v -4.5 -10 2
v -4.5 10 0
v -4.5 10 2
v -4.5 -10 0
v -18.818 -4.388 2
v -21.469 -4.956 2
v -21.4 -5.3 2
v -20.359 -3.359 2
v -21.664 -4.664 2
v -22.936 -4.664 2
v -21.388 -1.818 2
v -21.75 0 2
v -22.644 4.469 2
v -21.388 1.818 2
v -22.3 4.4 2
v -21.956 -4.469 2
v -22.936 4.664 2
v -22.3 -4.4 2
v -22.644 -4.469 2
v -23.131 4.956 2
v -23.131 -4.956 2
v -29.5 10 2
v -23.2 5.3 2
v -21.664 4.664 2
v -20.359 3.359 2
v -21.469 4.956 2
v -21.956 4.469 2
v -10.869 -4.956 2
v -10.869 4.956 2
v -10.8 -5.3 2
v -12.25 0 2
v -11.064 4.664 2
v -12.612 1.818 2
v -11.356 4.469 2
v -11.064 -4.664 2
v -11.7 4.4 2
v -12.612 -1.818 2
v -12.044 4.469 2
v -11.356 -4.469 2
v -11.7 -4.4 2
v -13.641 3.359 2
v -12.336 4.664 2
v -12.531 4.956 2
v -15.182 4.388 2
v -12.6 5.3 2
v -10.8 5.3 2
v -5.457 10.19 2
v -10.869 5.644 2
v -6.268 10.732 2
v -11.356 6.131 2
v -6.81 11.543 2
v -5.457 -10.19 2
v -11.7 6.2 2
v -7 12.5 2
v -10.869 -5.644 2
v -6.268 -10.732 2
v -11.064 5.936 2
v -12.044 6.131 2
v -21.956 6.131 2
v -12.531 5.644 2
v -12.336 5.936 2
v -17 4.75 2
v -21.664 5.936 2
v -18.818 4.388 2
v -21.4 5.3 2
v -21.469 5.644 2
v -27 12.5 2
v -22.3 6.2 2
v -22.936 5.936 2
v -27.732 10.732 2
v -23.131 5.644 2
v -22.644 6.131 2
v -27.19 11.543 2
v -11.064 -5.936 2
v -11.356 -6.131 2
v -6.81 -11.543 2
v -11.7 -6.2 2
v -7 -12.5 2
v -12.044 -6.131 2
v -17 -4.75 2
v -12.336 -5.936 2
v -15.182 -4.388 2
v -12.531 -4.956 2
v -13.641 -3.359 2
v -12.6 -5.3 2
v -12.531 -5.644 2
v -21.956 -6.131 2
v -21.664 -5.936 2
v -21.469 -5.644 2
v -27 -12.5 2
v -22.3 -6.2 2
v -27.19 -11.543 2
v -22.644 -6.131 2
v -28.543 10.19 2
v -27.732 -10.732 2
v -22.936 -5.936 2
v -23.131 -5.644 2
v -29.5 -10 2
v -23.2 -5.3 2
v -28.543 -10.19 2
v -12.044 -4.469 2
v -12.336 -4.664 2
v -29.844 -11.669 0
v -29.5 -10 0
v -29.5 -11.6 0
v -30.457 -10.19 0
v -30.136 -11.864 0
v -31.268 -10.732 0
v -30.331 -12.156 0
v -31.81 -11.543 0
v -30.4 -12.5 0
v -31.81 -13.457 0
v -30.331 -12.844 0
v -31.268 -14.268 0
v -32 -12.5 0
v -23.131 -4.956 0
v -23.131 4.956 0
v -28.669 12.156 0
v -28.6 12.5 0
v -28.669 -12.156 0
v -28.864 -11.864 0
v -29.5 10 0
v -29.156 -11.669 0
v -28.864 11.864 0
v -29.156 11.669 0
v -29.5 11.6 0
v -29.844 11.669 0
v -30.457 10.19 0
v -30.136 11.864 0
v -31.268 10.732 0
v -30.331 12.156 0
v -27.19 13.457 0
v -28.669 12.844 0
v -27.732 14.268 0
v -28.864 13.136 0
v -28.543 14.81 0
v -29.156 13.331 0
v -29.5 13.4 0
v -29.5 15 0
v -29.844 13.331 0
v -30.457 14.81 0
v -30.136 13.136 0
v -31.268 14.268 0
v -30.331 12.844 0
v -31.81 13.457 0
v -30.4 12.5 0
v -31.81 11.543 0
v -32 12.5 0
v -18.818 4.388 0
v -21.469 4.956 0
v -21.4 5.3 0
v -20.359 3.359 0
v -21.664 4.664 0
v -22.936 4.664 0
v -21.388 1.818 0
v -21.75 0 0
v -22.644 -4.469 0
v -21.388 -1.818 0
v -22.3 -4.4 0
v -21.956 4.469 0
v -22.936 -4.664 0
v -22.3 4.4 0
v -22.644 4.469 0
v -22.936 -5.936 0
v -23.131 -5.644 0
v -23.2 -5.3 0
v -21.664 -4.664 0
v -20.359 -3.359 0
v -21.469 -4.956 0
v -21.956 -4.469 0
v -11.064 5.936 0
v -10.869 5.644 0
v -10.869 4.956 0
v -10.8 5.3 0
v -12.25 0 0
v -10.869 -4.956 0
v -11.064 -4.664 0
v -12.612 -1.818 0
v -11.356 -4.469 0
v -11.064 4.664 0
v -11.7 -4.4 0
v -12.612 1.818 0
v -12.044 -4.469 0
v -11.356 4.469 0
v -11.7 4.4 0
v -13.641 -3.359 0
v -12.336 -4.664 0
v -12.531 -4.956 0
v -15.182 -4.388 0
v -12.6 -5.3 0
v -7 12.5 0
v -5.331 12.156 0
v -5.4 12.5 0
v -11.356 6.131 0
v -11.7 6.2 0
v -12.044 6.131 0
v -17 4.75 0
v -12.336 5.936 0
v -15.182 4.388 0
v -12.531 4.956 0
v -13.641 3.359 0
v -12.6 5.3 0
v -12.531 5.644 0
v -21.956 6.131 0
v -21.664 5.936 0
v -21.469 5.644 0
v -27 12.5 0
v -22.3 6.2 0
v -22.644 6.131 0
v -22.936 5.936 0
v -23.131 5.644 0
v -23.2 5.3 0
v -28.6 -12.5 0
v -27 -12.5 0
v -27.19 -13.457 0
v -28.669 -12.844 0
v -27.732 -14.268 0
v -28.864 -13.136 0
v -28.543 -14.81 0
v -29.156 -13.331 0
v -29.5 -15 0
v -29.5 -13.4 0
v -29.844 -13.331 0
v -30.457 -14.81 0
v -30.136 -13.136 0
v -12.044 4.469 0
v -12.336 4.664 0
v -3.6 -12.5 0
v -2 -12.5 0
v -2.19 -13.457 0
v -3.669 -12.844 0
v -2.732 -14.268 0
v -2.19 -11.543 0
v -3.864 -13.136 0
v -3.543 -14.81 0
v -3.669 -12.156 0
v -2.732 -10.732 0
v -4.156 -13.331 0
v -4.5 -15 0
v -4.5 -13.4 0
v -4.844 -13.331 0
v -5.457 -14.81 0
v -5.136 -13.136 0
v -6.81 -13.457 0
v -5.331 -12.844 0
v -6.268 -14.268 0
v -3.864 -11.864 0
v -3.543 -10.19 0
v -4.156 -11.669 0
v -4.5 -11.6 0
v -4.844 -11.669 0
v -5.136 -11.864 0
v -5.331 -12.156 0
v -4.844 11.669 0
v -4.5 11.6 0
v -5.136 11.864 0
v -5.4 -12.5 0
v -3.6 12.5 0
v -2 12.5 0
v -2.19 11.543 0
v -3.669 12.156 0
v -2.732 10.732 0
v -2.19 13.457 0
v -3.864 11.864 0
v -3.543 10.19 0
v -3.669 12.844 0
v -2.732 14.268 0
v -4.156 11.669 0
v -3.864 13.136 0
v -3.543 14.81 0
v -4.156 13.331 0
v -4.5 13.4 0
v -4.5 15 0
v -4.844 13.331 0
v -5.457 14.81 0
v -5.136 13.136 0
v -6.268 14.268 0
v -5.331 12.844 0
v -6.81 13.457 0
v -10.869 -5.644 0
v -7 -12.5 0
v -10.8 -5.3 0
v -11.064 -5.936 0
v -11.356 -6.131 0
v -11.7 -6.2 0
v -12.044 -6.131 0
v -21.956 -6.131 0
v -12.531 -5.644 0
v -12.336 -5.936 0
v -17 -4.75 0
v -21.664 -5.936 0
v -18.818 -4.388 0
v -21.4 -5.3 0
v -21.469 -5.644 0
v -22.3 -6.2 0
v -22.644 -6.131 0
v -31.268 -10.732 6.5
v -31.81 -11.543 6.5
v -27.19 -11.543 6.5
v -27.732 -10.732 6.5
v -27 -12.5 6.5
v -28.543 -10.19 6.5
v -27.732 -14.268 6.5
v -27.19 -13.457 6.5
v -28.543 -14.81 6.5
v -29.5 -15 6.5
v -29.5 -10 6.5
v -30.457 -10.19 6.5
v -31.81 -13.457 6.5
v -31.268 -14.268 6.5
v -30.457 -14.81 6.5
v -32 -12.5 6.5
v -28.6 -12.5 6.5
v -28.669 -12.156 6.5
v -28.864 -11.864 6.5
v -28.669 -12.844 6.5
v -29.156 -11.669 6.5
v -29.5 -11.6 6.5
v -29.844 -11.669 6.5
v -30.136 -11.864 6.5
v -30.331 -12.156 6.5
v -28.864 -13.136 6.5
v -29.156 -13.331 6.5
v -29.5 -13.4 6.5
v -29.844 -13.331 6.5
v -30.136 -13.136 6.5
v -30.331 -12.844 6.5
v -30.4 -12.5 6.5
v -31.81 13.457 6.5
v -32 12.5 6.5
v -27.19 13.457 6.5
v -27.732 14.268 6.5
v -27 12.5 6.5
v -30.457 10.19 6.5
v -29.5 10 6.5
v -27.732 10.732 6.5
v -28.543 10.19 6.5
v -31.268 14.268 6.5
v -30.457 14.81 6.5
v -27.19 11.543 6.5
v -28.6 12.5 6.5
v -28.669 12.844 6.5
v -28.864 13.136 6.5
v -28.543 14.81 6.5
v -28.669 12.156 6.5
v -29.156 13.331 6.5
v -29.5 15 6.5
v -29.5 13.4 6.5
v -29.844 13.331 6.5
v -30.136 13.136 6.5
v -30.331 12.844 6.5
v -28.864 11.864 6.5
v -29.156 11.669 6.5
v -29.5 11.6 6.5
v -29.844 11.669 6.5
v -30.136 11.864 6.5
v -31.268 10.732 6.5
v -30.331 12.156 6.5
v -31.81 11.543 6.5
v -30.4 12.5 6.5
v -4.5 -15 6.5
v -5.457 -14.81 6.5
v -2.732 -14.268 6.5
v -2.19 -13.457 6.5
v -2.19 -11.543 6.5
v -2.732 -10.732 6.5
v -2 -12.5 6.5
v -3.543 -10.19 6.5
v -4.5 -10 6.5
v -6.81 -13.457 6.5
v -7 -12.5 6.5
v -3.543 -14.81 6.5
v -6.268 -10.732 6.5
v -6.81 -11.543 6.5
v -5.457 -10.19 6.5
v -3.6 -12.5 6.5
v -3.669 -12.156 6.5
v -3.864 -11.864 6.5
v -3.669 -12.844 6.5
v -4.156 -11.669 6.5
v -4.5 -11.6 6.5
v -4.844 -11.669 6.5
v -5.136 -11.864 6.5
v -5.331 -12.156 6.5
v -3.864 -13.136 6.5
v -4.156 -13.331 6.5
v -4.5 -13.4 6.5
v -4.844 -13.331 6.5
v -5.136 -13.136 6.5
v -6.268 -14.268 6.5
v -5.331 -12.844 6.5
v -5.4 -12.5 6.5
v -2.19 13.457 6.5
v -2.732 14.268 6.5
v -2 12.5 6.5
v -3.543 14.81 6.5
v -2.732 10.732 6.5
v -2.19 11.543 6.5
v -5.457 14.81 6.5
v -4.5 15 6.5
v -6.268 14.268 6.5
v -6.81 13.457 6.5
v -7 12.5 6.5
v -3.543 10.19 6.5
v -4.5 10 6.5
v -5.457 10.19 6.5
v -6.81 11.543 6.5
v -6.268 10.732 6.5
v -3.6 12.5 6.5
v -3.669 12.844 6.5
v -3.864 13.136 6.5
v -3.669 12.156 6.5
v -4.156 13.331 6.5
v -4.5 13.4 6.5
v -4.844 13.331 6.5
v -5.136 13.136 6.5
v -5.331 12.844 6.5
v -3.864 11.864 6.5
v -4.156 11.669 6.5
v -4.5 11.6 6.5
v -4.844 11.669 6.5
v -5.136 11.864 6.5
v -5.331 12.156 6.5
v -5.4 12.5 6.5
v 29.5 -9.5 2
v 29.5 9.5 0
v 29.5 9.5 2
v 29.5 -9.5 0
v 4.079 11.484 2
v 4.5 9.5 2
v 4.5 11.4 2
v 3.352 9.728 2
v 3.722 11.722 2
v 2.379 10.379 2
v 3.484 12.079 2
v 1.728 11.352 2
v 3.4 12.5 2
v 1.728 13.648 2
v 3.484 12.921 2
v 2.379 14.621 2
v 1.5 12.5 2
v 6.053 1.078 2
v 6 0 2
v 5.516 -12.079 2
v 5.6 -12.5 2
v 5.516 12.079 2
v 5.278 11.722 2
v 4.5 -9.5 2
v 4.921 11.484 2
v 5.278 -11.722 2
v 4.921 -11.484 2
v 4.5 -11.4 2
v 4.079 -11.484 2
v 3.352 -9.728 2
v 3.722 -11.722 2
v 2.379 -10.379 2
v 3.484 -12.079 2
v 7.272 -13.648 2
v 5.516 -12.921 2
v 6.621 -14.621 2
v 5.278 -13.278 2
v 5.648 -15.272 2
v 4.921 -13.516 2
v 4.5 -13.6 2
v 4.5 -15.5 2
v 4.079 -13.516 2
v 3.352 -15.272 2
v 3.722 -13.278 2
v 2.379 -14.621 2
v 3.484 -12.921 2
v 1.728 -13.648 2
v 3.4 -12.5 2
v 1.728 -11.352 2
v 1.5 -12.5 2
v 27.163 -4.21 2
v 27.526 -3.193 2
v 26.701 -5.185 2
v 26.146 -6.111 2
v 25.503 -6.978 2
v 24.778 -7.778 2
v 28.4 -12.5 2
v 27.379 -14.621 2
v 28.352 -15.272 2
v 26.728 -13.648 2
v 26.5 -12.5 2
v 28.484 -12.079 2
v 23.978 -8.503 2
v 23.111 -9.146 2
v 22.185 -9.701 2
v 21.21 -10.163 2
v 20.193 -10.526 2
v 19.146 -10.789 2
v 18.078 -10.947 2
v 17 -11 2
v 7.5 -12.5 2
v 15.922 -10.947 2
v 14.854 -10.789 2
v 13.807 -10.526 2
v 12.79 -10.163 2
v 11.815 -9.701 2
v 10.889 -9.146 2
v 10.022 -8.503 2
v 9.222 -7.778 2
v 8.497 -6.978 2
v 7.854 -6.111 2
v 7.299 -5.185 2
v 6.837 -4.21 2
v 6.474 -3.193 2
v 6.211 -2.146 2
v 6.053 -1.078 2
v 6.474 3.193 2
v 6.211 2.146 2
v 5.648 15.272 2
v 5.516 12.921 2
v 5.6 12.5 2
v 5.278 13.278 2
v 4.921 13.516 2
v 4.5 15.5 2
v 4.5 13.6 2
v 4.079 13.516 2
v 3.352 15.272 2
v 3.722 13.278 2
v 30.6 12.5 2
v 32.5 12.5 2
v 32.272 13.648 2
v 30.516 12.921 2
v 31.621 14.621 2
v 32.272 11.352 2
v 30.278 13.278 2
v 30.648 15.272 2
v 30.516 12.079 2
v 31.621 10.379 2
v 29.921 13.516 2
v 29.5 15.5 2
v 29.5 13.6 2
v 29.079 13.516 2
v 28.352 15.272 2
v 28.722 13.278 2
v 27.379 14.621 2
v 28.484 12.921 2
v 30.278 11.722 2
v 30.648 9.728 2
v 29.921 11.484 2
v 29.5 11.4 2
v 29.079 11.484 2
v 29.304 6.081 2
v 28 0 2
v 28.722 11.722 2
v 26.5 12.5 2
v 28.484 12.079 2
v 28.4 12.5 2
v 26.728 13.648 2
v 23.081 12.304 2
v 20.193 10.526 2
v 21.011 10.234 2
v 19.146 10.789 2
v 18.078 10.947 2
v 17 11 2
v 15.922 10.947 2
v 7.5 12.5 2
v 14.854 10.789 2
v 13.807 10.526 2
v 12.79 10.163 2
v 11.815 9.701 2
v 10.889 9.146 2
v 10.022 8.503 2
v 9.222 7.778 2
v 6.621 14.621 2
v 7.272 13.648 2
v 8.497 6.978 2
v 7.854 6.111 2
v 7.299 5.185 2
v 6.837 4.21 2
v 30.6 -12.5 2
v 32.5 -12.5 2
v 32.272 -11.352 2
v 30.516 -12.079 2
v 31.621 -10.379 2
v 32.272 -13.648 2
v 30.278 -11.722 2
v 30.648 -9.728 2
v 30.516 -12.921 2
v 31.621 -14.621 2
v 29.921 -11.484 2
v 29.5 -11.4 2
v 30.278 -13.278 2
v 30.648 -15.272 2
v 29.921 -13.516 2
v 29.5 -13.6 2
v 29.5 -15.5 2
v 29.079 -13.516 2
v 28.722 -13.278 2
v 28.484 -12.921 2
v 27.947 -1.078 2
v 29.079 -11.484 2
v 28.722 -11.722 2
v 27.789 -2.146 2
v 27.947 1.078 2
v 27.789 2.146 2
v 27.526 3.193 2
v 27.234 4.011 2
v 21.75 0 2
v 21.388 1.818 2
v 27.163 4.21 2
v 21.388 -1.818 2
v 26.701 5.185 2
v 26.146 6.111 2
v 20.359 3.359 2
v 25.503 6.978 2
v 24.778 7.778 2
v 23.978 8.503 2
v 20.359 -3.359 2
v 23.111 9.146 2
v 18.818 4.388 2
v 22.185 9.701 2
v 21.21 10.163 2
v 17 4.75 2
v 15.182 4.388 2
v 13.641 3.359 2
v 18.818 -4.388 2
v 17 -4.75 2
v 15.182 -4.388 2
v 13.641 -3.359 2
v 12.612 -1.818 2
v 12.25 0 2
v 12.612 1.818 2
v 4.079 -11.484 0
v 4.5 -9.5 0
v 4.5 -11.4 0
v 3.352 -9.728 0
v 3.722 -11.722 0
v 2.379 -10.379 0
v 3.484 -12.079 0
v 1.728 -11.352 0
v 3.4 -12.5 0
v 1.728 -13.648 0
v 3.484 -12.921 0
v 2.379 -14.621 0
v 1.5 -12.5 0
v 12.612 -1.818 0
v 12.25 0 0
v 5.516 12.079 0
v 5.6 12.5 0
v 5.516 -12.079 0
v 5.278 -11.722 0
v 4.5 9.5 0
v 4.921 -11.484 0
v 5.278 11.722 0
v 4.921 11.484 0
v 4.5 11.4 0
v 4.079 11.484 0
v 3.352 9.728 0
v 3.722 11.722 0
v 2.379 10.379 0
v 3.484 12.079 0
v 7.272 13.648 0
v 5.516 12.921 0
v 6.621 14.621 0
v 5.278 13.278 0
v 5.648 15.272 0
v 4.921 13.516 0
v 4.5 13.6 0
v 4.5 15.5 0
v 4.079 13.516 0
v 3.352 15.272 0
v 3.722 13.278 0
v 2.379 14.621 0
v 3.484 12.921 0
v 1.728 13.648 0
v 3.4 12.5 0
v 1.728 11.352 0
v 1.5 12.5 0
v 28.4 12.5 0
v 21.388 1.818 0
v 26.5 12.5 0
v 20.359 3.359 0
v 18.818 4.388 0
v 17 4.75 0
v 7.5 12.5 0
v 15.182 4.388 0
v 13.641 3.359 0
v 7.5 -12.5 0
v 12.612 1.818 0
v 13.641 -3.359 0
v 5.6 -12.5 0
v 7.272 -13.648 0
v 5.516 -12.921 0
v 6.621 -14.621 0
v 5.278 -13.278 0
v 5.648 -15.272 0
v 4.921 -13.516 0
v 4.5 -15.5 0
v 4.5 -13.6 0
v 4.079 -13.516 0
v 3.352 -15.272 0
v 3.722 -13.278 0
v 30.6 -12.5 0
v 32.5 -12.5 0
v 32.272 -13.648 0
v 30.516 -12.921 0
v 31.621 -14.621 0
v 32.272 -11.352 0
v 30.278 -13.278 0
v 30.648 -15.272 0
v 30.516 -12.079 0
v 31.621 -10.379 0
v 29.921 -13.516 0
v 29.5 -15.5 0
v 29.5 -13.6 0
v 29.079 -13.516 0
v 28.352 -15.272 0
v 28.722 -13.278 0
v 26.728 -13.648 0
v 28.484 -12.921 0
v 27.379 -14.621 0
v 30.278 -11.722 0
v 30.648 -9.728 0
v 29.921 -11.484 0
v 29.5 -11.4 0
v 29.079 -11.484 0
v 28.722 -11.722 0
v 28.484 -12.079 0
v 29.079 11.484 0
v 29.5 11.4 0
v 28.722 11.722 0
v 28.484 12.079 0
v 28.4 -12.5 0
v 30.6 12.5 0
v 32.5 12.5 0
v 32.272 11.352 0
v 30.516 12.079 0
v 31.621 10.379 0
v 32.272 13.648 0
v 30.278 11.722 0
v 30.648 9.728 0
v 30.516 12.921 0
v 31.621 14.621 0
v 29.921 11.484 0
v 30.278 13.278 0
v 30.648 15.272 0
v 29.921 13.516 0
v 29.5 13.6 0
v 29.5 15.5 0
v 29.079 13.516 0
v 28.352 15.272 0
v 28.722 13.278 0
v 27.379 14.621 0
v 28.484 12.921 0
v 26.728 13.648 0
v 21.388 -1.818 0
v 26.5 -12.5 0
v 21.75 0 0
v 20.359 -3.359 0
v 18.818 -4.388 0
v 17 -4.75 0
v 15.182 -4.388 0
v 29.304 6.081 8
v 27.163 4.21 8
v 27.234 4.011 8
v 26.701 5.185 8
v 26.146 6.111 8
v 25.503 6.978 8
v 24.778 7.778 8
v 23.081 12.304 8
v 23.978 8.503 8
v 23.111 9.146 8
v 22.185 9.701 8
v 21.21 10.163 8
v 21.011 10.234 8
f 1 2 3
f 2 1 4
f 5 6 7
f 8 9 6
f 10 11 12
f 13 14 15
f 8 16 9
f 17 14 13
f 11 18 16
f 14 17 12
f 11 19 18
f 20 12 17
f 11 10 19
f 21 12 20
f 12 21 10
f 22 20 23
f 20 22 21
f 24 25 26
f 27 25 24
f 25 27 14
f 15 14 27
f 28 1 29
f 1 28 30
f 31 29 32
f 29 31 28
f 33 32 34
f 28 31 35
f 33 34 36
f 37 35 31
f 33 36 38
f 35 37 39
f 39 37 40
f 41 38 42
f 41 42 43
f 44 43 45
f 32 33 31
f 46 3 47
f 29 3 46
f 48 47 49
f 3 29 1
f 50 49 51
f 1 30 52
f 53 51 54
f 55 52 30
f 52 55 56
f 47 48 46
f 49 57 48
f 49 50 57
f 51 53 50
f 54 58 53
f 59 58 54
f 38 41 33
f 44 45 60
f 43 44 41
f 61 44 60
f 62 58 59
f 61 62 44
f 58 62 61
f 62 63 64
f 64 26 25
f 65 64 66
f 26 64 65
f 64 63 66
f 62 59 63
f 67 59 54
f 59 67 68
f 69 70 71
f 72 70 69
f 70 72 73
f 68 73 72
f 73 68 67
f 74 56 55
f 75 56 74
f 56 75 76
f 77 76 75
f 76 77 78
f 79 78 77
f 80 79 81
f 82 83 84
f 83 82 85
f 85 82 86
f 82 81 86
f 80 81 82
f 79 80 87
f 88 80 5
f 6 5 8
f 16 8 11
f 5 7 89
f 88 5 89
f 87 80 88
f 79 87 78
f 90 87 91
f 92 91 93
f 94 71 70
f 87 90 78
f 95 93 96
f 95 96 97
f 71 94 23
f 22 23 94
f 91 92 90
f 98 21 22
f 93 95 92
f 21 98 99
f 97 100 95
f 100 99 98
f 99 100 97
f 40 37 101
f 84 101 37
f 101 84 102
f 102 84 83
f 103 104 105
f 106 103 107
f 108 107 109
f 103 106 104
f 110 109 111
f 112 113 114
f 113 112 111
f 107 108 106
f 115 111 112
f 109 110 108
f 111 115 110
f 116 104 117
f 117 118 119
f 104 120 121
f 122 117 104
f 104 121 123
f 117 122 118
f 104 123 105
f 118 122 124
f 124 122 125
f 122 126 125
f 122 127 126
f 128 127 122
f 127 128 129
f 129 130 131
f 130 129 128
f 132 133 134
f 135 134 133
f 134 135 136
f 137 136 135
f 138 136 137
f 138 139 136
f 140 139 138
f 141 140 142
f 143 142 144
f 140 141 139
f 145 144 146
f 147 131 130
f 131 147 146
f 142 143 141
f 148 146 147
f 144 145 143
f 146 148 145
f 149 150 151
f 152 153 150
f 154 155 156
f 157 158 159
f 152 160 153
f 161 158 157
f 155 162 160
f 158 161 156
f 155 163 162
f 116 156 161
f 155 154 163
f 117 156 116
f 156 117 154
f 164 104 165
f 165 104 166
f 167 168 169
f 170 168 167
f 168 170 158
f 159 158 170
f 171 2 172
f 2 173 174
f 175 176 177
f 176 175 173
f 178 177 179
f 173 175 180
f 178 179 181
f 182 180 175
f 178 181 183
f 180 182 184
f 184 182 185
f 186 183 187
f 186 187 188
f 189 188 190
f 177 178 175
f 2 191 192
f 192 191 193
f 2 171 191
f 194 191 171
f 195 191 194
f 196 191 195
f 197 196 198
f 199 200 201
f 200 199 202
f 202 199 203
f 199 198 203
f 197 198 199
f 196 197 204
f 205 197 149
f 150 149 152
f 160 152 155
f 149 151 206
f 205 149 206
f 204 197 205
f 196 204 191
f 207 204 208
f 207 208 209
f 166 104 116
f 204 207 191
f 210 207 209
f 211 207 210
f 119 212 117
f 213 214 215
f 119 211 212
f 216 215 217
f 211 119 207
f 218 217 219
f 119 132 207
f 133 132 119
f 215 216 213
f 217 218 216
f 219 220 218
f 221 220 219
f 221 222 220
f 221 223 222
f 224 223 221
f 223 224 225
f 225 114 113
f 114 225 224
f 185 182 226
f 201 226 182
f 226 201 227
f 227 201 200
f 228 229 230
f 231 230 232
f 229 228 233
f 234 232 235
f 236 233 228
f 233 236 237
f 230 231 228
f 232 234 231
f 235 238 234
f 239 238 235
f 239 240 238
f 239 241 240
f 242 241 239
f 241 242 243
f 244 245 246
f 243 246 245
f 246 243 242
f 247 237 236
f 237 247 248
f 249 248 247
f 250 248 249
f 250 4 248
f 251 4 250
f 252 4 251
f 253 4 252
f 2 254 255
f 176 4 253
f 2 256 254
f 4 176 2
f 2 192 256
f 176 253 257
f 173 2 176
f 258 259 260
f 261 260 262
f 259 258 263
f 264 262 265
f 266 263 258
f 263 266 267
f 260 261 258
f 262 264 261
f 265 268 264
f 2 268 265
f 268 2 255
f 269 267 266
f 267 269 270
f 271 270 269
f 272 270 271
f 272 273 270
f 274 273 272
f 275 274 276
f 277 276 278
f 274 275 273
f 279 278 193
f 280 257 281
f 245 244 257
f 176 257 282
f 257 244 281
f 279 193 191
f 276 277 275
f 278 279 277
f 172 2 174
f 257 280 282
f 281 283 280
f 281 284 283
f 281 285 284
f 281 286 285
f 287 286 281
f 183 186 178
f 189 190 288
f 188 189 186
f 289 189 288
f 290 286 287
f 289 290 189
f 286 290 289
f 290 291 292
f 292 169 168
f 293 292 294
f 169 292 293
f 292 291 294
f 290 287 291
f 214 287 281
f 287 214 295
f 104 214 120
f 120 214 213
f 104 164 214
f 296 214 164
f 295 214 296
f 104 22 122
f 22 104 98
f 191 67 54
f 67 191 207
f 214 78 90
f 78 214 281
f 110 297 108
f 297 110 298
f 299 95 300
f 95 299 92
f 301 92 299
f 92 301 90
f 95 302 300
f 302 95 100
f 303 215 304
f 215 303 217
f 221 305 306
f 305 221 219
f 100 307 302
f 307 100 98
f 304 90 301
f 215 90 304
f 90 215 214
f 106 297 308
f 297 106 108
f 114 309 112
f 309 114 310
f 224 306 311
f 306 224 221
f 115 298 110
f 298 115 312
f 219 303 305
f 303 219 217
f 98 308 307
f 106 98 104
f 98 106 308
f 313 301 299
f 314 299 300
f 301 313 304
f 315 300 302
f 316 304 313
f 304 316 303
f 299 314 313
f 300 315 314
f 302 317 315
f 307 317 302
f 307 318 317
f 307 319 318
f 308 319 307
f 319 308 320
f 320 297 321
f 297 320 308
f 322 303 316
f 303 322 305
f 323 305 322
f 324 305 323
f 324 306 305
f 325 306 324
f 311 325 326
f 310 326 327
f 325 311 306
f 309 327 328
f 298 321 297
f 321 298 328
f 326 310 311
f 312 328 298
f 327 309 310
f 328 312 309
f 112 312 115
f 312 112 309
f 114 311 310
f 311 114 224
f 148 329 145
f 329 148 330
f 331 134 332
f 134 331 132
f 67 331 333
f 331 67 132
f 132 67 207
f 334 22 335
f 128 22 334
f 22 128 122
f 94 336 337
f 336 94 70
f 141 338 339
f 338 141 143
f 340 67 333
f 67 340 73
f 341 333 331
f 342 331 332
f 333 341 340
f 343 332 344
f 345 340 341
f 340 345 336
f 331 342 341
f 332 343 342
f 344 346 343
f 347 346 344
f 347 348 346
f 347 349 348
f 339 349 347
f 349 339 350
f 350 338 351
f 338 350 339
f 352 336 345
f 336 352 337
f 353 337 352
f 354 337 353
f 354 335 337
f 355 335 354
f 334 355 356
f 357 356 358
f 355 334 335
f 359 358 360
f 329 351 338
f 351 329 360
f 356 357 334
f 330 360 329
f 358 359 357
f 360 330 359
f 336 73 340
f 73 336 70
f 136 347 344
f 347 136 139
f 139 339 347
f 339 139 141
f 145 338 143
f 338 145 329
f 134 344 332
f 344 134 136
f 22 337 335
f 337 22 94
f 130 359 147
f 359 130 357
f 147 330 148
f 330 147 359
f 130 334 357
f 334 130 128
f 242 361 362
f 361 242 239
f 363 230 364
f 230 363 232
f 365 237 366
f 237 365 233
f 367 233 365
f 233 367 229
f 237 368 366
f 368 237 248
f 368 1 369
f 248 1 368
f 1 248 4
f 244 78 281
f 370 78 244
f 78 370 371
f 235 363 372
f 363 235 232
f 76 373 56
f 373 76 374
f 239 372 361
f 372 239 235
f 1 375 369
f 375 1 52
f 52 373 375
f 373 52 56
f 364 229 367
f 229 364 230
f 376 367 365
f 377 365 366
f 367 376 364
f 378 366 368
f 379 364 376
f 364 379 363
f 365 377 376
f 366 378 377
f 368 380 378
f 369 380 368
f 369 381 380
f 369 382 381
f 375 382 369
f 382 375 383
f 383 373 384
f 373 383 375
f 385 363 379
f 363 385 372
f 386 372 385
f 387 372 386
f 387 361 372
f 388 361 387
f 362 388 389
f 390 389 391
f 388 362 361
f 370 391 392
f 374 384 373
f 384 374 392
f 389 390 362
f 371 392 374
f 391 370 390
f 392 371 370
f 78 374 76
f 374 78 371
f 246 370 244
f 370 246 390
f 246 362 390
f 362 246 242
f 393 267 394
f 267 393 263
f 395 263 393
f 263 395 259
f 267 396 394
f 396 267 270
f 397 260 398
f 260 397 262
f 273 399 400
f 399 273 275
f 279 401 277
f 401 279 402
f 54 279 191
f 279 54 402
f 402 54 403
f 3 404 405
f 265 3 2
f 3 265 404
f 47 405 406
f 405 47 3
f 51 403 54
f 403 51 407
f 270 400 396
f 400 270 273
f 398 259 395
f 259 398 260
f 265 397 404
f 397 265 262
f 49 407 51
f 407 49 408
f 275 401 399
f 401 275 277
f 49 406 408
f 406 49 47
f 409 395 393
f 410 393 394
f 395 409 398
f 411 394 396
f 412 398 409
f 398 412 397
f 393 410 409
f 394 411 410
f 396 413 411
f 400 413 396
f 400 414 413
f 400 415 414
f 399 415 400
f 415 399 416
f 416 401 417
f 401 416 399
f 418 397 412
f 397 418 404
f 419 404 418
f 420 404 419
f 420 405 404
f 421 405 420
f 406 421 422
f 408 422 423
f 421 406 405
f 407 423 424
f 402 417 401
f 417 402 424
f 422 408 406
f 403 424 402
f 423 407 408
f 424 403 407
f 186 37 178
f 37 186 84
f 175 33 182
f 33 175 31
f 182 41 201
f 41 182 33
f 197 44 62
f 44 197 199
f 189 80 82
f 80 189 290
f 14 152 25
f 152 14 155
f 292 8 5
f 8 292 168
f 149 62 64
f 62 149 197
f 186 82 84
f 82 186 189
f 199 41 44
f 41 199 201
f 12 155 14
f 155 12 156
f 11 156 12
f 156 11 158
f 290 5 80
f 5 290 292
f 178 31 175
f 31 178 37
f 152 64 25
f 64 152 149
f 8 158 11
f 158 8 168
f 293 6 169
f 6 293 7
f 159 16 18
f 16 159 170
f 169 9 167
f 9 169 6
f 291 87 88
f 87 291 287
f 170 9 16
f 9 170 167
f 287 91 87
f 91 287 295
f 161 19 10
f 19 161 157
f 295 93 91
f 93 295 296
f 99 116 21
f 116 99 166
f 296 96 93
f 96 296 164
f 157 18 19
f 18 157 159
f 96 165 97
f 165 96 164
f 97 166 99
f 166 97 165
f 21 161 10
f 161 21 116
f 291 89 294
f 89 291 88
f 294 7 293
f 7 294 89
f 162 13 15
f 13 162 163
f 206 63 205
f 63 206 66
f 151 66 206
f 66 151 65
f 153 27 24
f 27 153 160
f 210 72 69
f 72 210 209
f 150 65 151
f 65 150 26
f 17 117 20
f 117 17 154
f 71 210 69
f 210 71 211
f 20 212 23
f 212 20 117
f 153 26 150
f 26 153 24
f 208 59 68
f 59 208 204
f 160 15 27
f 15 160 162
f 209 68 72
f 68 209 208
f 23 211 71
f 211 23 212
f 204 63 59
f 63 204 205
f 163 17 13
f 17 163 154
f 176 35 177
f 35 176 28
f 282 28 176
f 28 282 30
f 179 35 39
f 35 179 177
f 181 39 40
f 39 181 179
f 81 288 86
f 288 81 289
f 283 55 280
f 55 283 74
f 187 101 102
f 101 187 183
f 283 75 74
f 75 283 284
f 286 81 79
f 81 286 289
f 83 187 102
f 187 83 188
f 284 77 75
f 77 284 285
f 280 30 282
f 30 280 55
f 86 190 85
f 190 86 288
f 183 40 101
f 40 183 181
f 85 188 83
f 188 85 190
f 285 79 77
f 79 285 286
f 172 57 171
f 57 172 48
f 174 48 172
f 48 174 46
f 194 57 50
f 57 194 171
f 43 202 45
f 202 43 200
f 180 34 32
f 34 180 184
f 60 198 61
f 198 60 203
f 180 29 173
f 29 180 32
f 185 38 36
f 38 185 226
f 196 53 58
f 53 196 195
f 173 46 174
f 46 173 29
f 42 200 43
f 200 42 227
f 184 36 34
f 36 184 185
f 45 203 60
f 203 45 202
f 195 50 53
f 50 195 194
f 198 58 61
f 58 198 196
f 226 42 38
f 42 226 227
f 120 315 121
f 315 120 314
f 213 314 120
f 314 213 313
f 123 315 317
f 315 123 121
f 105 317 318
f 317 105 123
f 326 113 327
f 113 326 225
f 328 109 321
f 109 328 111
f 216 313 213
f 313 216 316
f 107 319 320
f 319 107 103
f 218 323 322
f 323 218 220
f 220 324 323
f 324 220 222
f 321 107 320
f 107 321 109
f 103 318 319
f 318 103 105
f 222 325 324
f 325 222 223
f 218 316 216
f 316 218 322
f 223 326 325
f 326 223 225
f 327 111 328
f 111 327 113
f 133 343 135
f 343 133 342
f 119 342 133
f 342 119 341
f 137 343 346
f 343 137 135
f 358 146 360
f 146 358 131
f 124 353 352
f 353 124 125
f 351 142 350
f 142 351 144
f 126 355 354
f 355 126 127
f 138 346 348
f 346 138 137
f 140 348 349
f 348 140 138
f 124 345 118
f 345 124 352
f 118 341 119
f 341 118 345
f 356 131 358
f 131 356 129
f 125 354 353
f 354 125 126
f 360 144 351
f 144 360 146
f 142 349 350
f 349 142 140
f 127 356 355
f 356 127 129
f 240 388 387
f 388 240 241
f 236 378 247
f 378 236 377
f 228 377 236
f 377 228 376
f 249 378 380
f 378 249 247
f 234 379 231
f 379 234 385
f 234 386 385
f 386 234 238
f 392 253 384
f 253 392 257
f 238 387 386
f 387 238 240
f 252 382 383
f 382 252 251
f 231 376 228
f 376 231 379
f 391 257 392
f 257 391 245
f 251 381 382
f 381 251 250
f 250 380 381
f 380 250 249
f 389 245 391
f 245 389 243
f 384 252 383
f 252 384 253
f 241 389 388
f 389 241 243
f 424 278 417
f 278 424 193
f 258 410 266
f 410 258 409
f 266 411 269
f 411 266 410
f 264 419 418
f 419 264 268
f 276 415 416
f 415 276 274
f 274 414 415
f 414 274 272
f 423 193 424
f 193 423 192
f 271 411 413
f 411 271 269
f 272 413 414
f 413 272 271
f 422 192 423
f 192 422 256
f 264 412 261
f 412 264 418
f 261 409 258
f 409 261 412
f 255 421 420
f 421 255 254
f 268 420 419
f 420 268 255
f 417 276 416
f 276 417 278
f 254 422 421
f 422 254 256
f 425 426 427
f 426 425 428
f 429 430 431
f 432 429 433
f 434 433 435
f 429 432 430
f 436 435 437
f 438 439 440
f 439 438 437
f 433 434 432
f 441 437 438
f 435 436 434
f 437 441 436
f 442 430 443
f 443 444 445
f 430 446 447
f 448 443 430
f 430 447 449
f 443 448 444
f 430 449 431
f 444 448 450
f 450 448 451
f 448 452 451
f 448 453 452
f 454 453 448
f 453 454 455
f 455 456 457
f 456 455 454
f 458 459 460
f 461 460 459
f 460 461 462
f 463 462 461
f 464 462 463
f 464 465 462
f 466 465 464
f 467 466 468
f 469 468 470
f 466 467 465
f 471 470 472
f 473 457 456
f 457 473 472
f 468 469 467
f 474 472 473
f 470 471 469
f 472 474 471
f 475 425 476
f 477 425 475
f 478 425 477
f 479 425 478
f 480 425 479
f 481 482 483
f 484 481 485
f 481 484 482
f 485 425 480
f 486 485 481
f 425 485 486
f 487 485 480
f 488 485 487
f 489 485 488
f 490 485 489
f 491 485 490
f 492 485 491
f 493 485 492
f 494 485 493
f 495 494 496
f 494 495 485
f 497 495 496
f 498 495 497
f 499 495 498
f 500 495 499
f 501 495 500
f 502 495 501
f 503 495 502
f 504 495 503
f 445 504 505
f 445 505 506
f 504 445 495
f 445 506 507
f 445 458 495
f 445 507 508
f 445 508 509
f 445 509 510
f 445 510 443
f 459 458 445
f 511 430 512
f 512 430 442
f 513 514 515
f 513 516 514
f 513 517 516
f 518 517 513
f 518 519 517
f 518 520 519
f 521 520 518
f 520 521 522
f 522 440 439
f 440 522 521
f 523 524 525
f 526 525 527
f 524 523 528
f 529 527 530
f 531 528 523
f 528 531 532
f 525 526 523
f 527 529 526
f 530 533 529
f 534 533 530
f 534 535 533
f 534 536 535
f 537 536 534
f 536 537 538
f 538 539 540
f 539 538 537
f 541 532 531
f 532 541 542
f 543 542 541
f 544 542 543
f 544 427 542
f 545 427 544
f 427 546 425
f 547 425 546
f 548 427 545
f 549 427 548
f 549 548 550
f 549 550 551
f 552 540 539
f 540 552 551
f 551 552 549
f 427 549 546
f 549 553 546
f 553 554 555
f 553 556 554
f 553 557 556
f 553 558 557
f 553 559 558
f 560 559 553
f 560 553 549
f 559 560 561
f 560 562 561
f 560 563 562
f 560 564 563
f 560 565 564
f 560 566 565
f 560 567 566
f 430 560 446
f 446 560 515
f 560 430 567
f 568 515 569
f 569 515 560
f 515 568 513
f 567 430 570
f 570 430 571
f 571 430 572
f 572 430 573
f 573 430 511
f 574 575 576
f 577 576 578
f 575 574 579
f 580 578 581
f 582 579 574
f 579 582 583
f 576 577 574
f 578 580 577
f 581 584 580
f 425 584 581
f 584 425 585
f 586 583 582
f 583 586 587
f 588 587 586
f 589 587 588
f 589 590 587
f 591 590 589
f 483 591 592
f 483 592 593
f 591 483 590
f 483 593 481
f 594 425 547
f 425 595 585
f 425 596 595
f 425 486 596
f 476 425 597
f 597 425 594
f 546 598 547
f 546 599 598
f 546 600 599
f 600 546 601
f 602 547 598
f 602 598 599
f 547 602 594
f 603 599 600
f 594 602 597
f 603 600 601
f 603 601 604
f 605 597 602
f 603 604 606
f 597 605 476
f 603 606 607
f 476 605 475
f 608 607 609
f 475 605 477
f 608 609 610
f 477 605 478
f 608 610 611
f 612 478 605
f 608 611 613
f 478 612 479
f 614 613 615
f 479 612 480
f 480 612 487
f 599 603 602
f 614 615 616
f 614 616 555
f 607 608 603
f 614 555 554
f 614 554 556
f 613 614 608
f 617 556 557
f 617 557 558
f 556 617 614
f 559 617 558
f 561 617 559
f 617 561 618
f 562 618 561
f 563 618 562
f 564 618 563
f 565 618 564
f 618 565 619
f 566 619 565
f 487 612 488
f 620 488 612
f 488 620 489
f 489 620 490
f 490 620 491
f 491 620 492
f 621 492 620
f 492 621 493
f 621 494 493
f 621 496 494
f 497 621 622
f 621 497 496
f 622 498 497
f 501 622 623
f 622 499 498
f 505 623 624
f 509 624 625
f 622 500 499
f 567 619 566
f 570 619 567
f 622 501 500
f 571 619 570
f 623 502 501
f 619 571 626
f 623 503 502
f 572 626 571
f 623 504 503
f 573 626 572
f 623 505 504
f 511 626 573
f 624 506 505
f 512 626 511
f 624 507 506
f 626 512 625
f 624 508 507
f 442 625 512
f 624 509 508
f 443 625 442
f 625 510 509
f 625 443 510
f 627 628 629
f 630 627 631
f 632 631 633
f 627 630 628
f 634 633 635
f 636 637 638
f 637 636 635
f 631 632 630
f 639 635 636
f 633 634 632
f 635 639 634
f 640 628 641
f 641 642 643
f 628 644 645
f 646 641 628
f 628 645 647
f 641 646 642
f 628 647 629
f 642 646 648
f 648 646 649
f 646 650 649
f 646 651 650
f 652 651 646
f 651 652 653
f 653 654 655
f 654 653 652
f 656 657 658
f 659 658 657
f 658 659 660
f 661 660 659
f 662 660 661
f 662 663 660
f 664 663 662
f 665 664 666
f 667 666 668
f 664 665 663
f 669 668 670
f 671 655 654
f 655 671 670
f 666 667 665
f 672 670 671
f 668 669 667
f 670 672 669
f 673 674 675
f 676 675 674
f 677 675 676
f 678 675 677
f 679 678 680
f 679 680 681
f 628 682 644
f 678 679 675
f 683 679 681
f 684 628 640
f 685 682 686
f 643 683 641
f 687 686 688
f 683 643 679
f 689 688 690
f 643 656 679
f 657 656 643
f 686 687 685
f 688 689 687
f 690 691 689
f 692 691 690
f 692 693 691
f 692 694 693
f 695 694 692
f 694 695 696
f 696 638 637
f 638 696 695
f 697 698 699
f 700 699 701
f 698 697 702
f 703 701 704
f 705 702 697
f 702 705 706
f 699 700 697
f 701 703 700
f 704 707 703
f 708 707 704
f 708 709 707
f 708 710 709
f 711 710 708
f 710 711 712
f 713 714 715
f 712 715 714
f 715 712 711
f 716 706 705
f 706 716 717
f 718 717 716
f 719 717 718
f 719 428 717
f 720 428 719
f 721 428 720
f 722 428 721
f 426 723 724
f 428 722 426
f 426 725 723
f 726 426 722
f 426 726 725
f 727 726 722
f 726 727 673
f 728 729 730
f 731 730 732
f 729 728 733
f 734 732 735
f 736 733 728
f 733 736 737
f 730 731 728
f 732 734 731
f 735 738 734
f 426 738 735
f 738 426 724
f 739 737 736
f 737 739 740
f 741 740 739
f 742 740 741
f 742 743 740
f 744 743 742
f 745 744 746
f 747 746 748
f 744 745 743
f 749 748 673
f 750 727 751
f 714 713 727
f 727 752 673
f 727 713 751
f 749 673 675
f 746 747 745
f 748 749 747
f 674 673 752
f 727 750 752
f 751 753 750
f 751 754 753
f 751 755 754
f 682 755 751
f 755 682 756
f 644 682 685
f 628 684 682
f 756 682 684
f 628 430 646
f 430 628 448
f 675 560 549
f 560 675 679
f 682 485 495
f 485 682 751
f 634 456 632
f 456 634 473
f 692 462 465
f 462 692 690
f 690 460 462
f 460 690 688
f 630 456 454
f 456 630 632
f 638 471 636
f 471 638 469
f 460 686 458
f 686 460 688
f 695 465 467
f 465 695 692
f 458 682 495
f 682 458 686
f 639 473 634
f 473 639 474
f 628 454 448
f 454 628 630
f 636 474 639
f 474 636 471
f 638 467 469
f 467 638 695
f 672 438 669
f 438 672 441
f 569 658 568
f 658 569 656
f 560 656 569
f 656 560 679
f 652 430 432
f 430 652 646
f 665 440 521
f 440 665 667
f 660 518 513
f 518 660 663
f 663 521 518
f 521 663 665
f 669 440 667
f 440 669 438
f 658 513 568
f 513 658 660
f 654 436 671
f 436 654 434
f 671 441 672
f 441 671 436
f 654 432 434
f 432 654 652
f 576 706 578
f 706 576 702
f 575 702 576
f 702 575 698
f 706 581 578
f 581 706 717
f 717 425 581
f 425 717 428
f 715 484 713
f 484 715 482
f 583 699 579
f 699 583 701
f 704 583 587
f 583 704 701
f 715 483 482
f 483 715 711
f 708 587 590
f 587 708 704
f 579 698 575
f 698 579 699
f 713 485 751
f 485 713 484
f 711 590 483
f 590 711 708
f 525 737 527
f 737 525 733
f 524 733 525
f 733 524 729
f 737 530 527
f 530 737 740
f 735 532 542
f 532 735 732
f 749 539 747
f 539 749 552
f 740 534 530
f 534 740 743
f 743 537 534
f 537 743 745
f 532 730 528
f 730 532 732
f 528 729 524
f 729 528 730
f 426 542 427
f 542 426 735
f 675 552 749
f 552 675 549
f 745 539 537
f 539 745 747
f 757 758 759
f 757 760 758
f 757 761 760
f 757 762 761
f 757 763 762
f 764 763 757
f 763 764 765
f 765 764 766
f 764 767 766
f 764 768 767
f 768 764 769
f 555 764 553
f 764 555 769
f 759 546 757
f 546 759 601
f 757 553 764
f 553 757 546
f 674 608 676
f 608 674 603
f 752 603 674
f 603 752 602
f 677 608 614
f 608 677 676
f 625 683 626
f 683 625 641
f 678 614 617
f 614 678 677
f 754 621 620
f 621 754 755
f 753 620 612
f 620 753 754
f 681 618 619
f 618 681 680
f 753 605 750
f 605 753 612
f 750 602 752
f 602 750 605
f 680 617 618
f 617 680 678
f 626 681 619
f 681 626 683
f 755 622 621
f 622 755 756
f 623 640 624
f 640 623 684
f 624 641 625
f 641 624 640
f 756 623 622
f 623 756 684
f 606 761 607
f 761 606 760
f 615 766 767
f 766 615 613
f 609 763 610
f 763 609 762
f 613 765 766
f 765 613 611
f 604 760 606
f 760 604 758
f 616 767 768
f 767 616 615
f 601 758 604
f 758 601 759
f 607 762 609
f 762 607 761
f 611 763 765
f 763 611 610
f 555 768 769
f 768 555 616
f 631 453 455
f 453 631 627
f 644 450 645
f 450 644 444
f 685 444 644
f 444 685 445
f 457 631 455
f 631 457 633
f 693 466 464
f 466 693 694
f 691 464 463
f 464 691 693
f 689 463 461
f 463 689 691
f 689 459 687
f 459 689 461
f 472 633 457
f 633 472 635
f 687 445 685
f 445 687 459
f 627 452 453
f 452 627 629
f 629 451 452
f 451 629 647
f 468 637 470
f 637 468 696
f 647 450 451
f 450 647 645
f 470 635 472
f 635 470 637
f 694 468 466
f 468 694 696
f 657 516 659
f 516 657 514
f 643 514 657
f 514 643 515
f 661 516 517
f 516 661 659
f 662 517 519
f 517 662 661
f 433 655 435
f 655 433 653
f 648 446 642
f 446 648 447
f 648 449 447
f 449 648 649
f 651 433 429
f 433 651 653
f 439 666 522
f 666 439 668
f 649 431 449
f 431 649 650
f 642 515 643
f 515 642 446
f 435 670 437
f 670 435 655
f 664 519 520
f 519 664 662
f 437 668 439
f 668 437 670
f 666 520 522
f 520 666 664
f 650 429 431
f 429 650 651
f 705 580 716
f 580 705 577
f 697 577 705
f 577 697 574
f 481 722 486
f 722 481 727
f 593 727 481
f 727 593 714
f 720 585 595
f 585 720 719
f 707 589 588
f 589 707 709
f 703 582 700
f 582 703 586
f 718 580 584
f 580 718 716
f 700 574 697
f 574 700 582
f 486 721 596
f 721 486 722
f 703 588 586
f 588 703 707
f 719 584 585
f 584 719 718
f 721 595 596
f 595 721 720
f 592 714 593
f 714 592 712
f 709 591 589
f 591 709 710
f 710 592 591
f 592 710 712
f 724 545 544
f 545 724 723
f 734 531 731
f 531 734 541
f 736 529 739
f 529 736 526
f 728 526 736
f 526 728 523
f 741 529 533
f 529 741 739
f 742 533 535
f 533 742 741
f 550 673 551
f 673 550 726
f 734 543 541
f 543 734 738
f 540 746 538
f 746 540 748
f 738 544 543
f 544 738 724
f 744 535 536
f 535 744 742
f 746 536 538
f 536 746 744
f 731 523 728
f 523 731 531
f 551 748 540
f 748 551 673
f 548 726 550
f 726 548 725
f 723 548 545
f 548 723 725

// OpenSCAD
//OpenSCAD-Skript

//Moduldefinition mit Parametern
module rahmen (
//Platte
leno=25,        //Länge u. Breite Platte
hght=2,         //Dicke der Platte
blthgh=6.5,     //Höhe der Baugruppe
dsh=5,          //Durchmesser der Träger
//Schrauben zur Front
FSdst=10.6,     //Schraubenabstand Frontschrauben
dsh1=2.2,       //Schaftdurchmesser
dsh2=1.8,       //Bohrung f. selbstschneidende Schrauben
//Drehschalter
RSWdia=9.5,     //Schaftdurchmesser Drehschalter
RSWdist=9.4,    //Mittenabstand Pin
RSWpin=3.5,     //Durchmesser Pin)
//Poti 10-Gang
POTdia=9.5,     //Schaftdurchmesser Gewinde
POTnase=8.8,    //Breite Haltenase
POThgh=6,       //Höhe Haltenase
POTkdia=22.5    //Körperdurchmesser Potigehäuse
)
//Beginn Modul
{
difference(){   //difference 1
union(){        //union 1
difference(){   //difference 2
union(){        //union 2
    //alles, was vor der nächsten geschweiften Klammer steht, wird zusammengefügt (union 2)

//Rahmenkörper
translate([-leno/2,-leno/2,0]) cube([leno,leno,hght]);
//Halterungen Schrauben
translate([-leno/2,-leno/2,0])  cylinder(d=dsh,h=blthgh,$fn=16);
translate([-leno/2,+leno/2,0])  cylinder(d=dsh,h=blthgh,$fn=16);
translate([+leno/2,-leno/2,0])  cylinder(d=dsh,h=blthgh,$fn=16);
translate([+leno/2,+leno/2,0])  cylinder(d=dsh,h=blthgh,$fn=16);
   
}               //union 2 end
    //alles, was vor der nächsten geschweiften Klammer steht, wird davon abgezogen (difference 2)
//Mittenbohrung Welle
translate([0,0,-0.1]) cylinder(d=RSWdia,h=20,$fn=16);
//Schraubenlöcher Front
translate([-FSdst/2,-FSdst/2,-0.1])  cylinder(d=dsh2,h=blthgh,$fn=16);
translate([-FSdst/2,+FSdst/2,-0.1])  cylinder(d=dsh2,h=blthgh,$fn=16);
translate([+FSdst/2,-FSdst/2,-0.1])  cylinder(d=dsh2,h=blthgh,$fn=16);
translate([+FSdst/2,+FSdst/2,-0.1])  cylinder(d=dsh2,h=blthgh,$fn=16);
//Bohrungen Schrauben
translate([-leno/2,-leno/2,-0.1])  cylinder(d=dsh2,h=2*blthgh,$fn=16);
translate([-leno/2,+leno/2,-0.1])  cylinder(d=dsh2,h=2*blthgh,$fn=16);
translate([+leno/2,-leno/2,-0.1])  cylinder(d=dsh2,h=2*blthgh,$fn=16);
translate([+leno/2,+leno/2,-0.1])  cylinder(d=dsh2,h=2*blthgh,$fn=16);

}  //difference 2 end
    //alles, was vor der nächsten geschweiften Klammer steht, wird dazu hinzugefügt (union 1)


}               //union 1 end
    //alles, was vor der nächsten geschweiften Klammer steht, wird davon wieder abgezogen (difference 1)

}               //difference 1 end

}  //module end

//.......................................................

module platte (
//Parameter
//Platte
leno=25,        //Länge u. Breite Platte
hght=2,         //Dicke der Platte
blthgh=6.5,     //Höhe der Baugruppe
dsh=6,          //Durchmesser der Träger
//Schrauben zur Front
dist=11,        //Schraubenabstand Frontschrauben
dsh1=2.2,       //Schaftdurchmesser
dsh2=1.8,       //Bohrung f. selbstschneidende Schrauben
//Drehschalter
RSWdia=9.5,     //Schaftdurchmesser Drehschalter
RSWdist=9.4,    //Mittenabstand Pin
RSWpin=3.5,     //Durchmesser Pin)
//Poti 10-Gang
POTdia=9.5,     //Schaftdurchmesser Gewinde
POTnase=8.8,    //Breite Haltenase
POThgh=6,       //Höhe Haltenase
POTkdia=22.5    //Körperdurchmesser Potigehäuse
)
//Beginn Modul
{
difference(){   //difference 1
union(){        //union 1
difference(){   //difference 2
union(){        //union 2
    //alles, was vor der nächsten geschweiften Klammer steht, wird zusammengefügt (union 2)

//Rahmenkörper
translate([-leno/2,-leno/2,0]) cube([leno,leno,hght]);
//Halterungen Schrauben
translate([-leno/2,-leno/2,0])  cylinder(d=dsh,h=hght,$fn=16);
translate([-leno/2,+leno/2,0])  cylinder(d=dsh,h=hght,$fn=16);
translate([+leno/2,-leno/2,0])  cylinder(d=dsh,h=hght,$fn=16);
translate([+leno/2,+leno/2,0])  cylinder(d=dsh,h=hght,$fn=16);
//Haltenase
rotate([0,0,45]) translate([0,-POTnase/2,hght]) cube([13,POTnase,POThgh]);
}               //union 2 end
    //alles, was vor der nächsten geschweiften Klammer steht, wird davon abgezogen (difference 2)
//Mittenbohrung Welle
translate([0,0,-0.1]) cylinder(d=RSWdia,h=20,$fn=16);
//Ausfräsung Haltenase
translate([0,0,hght]) cylinder(d=22,h=20,$fn=64);
//Bohrungen Schrauben
translate([-leno/2,-leno/2,-0.1])  cylinder(d=dsh1,h=2*blthgh,$fn=16);
translate([-leno/2,+leno/2,-0.1])  cylinder(d=dsh1,h=2*blthgh,$fn=16);
translate([+leno/2,-leno/2,-0.1])  cylinder(d=dsh1,h=2*blthgh,$fn=16);
translate([+leno/2,+leno/2,-0.1])  cylinder(d=dsh1,h=2*blthgh,$fn=16);

}  //difference 2 end
    //alles, was vor der nächsten geschweiften Klammer steht, wird dazu hinzugefügt (union 1)


}               //union 1 end
    //alles, was vor der nächsten geschweiften Klammer steht, wird davon wieder abgezogen (difference 1)

}               //difference 1 end

}  //module end


//Hier werden Instanzen des Moduls aufgerufen
translate([-17,0,0]) rahmen();
translate([17,0,0]) platte();
